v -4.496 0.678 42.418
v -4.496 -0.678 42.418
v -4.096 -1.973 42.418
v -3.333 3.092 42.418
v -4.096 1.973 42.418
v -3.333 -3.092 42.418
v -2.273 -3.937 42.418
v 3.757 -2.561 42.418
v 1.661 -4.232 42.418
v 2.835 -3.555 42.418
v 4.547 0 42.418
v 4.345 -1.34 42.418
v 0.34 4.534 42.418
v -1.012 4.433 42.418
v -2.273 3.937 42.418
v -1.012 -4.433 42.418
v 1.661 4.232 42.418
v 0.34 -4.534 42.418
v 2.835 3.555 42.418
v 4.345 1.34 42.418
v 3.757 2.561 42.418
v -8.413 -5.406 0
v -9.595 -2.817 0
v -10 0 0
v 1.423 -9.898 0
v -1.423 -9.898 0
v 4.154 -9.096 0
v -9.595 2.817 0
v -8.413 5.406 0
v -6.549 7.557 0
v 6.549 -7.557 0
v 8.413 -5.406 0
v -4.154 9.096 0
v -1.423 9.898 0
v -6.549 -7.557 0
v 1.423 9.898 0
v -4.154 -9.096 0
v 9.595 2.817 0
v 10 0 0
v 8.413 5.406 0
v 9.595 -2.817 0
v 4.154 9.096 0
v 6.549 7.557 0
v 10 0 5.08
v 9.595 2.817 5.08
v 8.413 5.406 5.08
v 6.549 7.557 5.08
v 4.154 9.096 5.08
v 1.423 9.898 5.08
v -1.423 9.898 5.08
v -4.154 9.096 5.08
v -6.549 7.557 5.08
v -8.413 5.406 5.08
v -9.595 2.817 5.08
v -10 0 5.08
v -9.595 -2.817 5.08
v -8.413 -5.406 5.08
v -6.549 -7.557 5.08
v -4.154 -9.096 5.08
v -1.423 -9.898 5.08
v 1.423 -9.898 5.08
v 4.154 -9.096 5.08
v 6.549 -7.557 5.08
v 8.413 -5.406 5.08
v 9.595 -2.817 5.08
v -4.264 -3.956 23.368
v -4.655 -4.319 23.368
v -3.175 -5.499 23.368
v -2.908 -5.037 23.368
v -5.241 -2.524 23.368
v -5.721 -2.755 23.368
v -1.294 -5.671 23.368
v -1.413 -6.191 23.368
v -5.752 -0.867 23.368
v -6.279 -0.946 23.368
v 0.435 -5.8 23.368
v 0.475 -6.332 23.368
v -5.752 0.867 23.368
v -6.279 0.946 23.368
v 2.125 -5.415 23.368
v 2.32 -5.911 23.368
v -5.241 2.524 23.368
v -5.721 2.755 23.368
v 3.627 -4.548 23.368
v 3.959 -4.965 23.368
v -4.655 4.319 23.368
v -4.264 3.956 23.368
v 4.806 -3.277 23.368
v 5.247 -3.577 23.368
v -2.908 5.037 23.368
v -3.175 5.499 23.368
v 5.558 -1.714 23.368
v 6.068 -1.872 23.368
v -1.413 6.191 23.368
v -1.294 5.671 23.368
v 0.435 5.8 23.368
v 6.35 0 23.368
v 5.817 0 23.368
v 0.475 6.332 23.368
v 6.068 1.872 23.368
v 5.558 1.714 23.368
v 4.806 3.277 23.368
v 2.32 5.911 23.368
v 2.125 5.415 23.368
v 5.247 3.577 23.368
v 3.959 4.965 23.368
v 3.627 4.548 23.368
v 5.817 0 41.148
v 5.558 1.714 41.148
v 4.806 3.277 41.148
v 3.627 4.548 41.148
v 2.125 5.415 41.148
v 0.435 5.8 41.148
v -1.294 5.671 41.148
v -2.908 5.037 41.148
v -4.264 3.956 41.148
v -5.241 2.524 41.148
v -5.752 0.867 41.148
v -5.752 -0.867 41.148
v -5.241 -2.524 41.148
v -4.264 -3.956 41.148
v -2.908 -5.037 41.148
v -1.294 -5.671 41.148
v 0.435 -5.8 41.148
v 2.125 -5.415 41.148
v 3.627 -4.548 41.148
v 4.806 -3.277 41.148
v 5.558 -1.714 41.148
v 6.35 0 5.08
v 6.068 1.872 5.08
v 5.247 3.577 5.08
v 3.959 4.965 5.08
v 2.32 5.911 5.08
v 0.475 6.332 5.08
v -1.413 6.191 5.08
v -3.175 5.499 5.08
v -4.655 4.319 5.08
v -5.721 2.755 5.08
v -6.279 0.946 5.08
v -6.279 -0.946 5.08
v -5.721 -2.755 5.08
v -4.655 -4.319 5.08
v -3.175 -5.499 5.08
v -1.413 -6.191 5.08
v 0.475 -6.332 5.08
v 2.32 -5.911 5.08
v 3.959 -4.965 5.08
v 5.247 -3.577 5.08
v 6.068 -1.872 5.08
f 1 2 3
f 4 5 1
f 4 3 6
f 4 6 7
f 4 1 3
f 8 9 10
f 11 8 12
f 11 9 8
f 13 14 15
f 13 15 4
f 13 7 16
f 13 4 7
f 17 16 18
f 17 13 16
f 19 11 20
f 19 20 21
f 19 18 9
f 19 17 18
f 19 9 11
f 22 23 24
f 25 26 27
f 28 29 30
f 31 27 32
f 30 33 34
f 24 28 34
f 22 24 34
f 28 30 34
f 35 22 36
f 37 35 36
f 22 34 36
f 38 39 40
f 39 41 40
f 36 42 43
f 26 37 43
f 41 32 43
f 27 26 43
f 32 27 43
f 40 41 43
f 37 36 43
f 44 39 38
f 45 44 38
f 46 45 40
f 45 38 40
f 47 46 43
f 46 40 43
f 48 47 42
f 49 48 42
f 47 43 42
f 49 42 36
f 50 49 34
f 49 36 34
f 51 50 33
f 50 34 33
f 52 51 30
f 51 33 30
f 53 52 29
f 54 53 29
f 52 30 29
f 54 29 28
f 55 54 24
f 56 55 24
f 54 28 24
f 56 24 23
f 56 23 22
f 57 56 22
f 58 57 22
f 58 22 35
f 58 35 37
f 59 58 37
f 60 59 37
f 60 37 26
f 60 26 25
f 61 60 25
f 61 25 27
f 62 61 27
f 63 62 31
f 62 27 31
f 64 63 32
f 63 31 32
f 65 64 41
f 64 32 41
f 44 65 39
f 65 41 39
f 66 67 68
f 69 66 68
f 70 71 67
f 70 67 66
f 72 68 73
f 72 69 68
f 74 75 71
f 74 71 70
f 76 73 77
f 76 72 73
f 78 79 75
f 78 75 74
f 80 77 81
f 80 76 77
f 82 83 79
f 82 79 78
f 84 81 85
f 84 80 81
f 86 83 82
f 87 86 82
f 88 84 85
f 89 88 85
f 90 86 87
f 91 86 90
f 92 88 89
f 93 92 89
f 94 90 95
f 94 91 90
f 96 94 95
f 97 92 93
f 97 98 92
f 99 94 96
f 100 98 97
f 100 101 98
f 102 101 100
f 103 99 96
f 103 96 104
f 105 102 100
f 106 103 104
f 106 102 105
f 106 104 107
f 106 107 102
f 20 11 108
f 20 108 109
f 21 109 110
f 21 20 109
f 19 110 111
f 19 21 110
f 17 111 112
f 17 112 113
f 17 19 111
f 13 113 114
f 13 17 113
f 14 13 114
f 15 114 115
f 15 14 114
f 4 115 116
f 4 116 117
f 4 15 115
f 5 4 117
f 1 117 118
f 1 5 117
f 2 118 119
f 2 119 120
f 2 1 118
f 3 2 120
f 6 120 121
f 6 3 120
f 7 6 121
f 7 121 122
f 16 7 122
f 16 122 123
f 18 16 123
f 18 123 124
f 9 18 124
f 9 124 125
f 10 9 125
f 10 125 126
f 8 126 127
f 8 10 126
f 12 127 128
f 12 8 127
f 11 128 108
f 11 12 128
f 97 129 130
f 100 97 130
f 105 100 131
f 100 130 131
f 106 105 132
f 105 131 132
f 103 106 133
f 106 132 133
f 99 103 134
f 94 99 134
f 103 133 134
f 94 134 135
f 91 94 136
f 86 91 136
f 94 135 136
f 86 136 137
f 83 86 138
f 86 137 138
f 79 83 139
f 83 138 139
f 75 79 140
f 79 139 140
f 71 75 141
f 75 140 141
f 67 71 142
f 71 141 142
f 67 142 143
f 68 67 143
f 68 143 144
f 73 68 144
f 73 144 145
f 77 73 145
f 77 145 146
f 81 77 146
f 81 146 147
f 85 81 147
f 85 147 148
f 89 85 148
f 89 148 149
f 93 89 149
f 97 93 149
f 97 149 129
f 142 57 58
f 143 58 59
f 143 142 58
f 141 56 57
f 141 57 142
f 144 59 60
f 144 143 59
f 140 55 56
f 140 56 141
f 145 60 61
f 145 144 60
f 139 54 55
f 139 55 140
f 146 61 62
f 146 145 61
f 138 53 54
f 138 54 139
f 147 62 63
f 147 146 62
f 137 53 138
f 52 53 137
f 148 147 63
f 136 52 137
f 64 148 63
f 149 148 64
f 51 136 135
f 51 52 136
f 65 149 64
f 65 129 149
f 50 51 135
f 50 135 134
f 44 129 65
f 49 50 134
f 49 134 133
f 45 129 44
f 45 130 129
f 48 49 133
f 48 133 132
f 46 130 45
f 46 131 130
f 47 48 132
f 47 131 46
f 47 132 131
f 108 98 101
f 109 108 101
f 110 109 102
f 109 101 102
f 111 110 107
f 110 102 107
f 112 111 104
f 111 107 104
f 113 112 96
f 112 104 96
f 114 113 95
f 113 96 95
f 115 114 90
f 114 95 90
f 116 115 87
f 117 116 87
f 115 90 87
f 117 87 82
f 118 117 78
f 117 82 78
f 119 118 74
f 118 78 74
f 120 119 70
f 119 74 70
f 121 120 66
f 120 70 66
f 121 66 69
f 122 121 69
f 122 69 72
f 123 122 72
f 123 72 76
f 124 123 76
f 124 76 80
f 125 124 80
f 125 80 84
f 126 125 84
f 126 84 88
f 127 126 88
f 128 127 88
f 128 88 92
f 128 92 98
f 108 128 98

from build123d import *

# Parameters (mm, degrees)
F0_R     = 10
F0_R_2   = 6.35
F0_R_3   = 5.8166
F1_DEPTH = 5.08
F2_DEPTH = 23.368
F3_DEPTH = 42.418
F4_SIZE  = 1.27


with BuildPart() as f1:
    # F0 (on Top) → F1 (new body)
    with BuildSketch(Plane.XY):
        Circle(F0_R)
        Circle(F0_R_2, mode=Mode.SUBTRACT)
        Circle(F0_R_2)
        Circle(F0_R_3, mode=Mode.SUBTRACT)
        Circle(F0_R_3)
    extrude(amount=F1_DEPTH)

    # F0 (on Top) → F2 (join)
    with BuildSketch(Plane.XY):
        Circle(F0_R_2)
        Circle(F0_R_3, mode=Mode.SUBTRACT)
        Circle(F0_R_3)
    extrude(amount=F2_DEPTH)

    # F0 (on Top) → F3 (join)
    with BuildSketch(Plane.XY):
        Circle(F0_R_3)
    extrude(amount=F3_DEPTH)

    # F4
    f4_edges = [f1.edges().sort_by_distance(p)[0] for p in [
        (-5.8166, 0, 42.418),
    ]]
    chamfer(f4_edges, length=F4_SIZE)


solid = f1.part
